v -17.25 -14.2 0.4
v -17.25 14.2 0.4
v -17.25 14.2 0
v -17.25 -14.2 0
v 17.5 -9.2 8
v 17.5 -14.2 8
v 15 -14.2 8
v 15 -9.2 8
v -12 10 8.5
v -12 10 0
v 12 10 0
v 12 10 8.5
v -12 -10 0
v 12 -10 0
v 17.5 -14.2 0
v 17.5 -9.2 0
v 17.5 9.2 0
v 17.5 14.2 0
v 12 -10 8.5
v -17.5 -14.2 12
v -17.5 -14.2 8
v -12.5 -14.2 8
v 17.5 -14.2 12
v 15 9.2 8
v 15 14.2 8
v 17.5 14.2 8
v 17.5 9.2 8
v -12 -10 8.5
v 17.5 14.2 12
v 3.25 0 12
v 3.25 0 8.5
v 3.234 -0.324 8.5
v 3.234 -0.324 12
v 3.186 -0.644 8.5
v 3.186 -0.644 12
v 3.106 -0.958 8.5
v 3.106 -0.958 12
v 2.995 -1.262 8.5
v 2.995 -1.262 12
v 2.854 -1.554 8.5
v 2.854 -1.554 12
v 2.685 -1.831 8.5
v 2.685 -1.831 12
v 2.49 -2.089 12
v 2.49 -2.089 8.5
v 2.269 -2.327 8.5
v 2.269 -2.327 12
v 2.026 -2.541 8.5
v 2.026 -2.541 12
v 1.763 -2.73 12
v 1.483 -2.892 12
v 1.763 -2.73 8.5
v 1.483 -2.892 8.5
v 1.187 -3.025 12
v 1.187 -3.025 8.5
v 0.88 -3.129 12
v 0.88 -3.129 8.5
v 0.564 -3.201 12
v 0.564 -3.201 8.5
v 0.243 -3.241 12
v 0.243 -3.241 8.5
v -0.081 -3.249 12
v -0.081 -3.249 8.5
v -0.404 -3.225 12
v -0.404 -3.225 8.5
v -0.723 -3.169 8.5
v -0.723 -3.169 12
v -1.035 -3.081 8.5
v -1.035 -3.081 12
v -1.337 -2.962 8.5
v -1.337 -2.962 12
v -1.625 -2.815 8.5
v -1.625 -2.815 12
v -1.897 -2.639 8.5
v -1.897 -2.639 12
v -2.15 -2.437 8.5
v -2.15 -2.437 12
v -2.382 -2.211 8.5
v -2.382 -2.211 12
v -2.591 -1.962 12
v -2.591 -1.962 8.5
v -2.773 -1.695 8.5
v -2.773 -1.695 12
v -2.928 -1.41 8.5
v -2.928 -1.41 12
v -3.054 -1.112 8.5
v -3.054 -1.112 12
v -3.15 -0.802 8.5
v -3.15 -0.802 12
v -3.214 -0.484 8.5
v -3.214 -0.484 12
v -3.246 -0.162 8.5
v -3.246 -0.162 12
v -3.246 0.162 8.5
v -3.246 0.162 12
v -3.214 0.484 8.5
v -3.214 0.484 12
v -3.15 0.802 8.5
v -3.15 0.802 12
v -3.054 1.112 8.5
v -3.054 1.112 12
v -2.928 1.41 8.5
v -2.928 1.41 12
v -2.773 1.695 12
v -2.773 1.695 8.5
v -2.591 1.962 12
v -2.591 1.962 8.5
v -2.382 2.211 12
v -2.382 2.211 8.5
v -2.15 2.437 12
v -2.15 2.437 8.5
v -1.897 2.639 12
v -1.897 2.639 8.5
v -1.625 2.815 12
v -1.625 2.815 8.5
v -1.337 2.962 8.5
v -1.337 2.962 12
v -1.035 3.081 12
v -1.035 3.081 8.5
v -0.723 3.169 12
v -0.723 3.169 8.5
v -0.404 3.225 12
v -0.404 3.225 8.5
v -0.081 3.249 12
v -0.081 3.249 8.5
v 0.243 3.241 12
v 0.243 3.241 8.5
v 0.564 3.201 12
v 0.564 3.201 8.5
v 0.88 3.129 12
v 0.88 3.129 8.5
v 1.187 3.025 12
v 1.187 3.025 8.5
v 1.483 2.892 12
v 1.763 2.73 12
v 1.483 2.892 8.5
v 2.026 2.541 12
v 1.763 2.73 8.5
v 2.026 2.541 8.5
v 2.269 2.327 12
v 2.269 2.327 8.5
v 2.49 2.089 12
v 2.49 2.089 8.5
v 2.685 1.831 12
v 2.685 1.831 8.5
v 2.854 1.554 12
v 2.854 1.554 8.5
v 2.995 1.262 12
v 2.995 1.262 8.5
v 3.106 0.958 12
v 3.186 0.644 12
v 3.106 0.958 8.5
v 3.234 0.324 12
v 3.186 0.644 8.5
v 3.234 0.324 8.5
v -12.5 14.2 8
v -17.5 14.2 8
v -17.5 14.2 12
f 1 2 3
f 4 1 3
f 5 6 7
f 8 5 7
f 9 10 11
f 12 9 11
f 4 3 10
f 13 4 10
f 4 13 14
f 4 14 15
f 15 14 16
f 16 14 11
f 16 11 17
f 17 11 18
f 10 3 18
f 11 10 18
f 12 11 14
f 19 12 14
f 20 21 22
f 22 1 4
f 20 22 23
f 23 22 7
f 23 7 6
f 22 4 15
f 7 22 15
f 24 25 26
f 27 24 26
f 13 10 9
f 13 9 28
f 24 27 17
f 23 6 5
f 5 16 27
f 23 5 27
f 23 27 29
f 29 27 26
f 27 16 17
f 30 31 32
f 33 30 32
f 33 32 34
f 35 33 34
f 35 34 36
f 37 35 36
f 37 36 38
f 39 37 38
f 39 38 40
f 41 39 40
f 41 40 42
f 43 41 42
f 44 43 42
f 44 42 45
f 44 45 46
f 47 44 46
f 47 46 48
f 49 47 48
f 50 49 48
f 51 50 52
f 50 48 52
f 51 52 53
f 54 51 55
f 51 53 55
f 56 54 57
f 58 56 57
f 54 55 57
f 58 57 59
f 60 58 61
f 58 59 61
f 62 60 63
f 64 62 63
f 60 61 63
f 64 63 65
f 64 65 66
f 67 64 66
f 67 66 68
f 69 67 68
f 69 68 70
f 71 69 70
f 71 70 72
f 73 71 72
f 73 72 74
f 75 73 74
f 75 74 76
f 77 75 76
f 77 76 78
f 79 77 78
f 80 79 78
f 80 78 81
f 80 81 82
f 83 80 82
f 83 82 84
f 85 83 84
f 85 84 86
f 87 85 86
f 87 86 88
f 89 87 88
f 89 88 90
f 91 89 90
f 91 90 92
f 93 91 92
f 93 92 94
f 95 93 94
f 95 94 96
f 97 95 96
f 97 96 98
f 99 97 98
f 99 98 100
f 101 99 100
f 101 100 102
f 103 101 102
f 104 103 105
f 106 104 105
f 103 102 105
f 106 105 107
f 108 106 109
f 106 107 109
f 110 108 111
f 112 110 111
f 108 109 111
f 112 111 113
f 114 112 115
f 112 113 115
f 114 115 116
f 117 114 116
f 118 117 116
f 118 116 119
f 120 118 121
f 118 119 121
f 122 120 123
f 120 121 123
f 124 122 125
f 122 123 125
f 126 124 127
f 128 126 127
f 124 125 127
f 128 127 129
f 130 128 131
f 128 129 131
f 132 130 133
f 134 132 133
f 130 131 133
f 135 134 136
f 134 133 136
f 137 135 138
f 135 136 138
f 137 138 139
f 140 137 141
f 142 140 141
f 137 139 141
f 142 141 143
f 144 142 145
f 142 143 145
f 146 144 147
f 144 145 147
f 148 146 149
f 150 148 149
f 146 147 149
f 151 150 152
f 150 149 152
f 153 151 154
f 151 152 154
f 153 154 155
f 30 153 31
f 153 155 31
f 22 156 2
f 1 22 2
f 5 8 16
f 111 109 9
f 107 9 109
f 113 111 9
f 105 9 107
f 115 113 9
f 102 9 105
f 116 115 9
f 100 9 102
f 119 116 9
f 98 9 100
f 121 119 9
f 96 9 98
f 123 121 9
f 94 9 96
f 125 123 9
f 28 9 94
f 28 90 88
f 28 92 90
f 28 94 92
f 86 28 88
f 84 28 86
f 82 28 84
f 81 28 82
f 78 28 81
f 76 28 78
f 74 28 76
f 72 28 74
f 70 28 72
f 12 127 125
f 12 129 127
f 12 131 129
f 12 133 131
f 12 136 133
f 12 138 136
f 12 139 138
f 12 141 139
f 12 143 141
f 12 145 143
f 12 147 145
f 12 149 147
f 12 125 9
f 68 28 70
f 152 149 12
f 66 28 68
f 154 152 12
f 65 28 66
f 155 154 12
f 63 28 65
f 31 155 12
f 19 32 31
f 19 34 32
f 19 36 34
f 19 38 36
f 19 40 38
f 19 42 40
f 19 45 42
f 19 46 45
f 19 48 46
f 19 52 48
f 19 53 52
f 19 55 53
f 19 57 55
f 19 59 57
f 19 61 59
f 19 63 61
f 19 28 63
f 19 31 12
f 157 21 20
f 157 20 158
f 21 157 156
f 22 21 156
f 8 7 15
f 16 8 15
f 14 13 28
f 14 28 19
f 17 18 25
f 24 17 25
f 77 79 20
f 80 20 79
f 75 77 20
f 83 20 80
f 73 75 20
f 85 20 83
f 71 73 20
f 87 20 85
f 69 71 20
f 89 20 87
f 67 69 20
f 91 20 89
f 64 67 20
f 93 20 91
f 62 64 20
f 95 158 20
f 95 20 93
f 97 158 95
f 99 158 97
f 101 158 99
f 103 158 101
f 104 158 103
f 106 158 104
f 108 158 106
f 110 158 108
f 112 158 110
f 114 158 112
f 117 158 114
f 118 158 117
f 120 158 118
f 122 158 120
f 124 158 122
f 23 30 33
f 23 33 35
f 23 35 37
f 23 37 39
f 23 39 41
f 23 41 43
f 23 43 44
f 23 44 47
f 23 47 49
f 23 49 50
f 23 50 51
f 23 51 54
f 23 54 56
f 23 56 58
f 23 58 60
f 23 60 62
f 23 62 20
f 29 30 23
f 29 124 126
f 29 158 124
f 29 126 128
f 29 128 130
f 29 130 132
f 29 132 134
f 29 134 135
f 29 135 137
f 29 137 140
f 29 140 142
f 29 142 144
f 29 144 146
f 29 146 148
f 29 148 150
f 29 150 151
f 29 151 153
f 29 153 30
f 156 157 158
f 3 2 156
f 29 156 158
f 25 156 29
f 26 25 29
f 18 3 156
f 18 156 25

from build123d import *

# Parameters (mm, degrees)
F0_W      = 35
F0_H      = 28.4
F1_DEPTH  = 12
F3_DEPTH  = 5
F5_DEPTH  = 5
F7_DEPTH  = 36.3
F8_W      = 24
F8_H      = 20
F9_DEPTH  = 8.5
F10_R     = 3.25
F11_DEPTH = 25
F13_DEPTH = 28.4


with BuildPart() as f1:
    # F0 (on Top) → F1 (new body)
    with BuildSketch(Plane.XY):
        Rectangle(F0_W, F0_H)
    extrude(amount=F1_DEPTH)

    # F2 (on face) → F3 (cut)
    with BuildSketch(Plane.XZ.offset(14.2)):
        Polygon((15, 8), (17.5, 0), (17.5, 8), align=None)
    extrude(amount=-F3_DEPTH, mode=Mode.SUBTRACT)

    # F4 (on face) → F5 (cut)
    with BuildSketch(Plane(origin=(0, 14.2, 0), x_dir=(-1, 0, 0), z_dir=(0, 1, 0))):
        Polygon((-15, 8), (-17.5, 8), (-17.5, 0), align=None)
    extrude(amount=-F5_DEPTH, mode=Mode.SUBTRACT)

    # F6 (on face) → F7 (cut)
    with BuildSketch(Plane(origin=(0, 14.2, 0), x_dir=(-1, 0, 0), z_dir=(0, 1, 0))):
        Polygon((12.5, 8), (17.5, 0), (17.5, 8), align=None)
    extrude(amount=-F7_DEPTH, mode=Mode.SUBTRACT)

    # F8 (on face) → F9 (cut)
    with BuildSketch(Plane(origin=(0, 0, 0), x_dir=(1, 0, 0), z_dir=(0, 0, -1))):
        Rectangle(F8_W, F8_H)
    extrude(amount=-F9_DEPTH, mode=Mode.SUBTRACT)

    # F10 (on face) → F11 (cut)
    with BuildSketch(Plane(origin=(0, 0, 8.5), x_dir=(1, 0, 0), z_dir=(0, 0, -1))):
        Circle(F10_R)
    extrude(amount=-F11_DEPTH, mode=Mode.SUBTRACT)

    # F12 (on face) → F13 (cut, through all)
    with BuildSketch(Plane(origin=(0, 14.2, 0), x_dir=(-1, 0, 0), z_dir=(0, 1, 0))):
        Polygon((17.25, 0), (17.5, 0), (17.25, 0.4), align=None)
    extrude(amount=-F13_DEPTH, mode=Mode.SUBTRACT)


solid = f1.part
